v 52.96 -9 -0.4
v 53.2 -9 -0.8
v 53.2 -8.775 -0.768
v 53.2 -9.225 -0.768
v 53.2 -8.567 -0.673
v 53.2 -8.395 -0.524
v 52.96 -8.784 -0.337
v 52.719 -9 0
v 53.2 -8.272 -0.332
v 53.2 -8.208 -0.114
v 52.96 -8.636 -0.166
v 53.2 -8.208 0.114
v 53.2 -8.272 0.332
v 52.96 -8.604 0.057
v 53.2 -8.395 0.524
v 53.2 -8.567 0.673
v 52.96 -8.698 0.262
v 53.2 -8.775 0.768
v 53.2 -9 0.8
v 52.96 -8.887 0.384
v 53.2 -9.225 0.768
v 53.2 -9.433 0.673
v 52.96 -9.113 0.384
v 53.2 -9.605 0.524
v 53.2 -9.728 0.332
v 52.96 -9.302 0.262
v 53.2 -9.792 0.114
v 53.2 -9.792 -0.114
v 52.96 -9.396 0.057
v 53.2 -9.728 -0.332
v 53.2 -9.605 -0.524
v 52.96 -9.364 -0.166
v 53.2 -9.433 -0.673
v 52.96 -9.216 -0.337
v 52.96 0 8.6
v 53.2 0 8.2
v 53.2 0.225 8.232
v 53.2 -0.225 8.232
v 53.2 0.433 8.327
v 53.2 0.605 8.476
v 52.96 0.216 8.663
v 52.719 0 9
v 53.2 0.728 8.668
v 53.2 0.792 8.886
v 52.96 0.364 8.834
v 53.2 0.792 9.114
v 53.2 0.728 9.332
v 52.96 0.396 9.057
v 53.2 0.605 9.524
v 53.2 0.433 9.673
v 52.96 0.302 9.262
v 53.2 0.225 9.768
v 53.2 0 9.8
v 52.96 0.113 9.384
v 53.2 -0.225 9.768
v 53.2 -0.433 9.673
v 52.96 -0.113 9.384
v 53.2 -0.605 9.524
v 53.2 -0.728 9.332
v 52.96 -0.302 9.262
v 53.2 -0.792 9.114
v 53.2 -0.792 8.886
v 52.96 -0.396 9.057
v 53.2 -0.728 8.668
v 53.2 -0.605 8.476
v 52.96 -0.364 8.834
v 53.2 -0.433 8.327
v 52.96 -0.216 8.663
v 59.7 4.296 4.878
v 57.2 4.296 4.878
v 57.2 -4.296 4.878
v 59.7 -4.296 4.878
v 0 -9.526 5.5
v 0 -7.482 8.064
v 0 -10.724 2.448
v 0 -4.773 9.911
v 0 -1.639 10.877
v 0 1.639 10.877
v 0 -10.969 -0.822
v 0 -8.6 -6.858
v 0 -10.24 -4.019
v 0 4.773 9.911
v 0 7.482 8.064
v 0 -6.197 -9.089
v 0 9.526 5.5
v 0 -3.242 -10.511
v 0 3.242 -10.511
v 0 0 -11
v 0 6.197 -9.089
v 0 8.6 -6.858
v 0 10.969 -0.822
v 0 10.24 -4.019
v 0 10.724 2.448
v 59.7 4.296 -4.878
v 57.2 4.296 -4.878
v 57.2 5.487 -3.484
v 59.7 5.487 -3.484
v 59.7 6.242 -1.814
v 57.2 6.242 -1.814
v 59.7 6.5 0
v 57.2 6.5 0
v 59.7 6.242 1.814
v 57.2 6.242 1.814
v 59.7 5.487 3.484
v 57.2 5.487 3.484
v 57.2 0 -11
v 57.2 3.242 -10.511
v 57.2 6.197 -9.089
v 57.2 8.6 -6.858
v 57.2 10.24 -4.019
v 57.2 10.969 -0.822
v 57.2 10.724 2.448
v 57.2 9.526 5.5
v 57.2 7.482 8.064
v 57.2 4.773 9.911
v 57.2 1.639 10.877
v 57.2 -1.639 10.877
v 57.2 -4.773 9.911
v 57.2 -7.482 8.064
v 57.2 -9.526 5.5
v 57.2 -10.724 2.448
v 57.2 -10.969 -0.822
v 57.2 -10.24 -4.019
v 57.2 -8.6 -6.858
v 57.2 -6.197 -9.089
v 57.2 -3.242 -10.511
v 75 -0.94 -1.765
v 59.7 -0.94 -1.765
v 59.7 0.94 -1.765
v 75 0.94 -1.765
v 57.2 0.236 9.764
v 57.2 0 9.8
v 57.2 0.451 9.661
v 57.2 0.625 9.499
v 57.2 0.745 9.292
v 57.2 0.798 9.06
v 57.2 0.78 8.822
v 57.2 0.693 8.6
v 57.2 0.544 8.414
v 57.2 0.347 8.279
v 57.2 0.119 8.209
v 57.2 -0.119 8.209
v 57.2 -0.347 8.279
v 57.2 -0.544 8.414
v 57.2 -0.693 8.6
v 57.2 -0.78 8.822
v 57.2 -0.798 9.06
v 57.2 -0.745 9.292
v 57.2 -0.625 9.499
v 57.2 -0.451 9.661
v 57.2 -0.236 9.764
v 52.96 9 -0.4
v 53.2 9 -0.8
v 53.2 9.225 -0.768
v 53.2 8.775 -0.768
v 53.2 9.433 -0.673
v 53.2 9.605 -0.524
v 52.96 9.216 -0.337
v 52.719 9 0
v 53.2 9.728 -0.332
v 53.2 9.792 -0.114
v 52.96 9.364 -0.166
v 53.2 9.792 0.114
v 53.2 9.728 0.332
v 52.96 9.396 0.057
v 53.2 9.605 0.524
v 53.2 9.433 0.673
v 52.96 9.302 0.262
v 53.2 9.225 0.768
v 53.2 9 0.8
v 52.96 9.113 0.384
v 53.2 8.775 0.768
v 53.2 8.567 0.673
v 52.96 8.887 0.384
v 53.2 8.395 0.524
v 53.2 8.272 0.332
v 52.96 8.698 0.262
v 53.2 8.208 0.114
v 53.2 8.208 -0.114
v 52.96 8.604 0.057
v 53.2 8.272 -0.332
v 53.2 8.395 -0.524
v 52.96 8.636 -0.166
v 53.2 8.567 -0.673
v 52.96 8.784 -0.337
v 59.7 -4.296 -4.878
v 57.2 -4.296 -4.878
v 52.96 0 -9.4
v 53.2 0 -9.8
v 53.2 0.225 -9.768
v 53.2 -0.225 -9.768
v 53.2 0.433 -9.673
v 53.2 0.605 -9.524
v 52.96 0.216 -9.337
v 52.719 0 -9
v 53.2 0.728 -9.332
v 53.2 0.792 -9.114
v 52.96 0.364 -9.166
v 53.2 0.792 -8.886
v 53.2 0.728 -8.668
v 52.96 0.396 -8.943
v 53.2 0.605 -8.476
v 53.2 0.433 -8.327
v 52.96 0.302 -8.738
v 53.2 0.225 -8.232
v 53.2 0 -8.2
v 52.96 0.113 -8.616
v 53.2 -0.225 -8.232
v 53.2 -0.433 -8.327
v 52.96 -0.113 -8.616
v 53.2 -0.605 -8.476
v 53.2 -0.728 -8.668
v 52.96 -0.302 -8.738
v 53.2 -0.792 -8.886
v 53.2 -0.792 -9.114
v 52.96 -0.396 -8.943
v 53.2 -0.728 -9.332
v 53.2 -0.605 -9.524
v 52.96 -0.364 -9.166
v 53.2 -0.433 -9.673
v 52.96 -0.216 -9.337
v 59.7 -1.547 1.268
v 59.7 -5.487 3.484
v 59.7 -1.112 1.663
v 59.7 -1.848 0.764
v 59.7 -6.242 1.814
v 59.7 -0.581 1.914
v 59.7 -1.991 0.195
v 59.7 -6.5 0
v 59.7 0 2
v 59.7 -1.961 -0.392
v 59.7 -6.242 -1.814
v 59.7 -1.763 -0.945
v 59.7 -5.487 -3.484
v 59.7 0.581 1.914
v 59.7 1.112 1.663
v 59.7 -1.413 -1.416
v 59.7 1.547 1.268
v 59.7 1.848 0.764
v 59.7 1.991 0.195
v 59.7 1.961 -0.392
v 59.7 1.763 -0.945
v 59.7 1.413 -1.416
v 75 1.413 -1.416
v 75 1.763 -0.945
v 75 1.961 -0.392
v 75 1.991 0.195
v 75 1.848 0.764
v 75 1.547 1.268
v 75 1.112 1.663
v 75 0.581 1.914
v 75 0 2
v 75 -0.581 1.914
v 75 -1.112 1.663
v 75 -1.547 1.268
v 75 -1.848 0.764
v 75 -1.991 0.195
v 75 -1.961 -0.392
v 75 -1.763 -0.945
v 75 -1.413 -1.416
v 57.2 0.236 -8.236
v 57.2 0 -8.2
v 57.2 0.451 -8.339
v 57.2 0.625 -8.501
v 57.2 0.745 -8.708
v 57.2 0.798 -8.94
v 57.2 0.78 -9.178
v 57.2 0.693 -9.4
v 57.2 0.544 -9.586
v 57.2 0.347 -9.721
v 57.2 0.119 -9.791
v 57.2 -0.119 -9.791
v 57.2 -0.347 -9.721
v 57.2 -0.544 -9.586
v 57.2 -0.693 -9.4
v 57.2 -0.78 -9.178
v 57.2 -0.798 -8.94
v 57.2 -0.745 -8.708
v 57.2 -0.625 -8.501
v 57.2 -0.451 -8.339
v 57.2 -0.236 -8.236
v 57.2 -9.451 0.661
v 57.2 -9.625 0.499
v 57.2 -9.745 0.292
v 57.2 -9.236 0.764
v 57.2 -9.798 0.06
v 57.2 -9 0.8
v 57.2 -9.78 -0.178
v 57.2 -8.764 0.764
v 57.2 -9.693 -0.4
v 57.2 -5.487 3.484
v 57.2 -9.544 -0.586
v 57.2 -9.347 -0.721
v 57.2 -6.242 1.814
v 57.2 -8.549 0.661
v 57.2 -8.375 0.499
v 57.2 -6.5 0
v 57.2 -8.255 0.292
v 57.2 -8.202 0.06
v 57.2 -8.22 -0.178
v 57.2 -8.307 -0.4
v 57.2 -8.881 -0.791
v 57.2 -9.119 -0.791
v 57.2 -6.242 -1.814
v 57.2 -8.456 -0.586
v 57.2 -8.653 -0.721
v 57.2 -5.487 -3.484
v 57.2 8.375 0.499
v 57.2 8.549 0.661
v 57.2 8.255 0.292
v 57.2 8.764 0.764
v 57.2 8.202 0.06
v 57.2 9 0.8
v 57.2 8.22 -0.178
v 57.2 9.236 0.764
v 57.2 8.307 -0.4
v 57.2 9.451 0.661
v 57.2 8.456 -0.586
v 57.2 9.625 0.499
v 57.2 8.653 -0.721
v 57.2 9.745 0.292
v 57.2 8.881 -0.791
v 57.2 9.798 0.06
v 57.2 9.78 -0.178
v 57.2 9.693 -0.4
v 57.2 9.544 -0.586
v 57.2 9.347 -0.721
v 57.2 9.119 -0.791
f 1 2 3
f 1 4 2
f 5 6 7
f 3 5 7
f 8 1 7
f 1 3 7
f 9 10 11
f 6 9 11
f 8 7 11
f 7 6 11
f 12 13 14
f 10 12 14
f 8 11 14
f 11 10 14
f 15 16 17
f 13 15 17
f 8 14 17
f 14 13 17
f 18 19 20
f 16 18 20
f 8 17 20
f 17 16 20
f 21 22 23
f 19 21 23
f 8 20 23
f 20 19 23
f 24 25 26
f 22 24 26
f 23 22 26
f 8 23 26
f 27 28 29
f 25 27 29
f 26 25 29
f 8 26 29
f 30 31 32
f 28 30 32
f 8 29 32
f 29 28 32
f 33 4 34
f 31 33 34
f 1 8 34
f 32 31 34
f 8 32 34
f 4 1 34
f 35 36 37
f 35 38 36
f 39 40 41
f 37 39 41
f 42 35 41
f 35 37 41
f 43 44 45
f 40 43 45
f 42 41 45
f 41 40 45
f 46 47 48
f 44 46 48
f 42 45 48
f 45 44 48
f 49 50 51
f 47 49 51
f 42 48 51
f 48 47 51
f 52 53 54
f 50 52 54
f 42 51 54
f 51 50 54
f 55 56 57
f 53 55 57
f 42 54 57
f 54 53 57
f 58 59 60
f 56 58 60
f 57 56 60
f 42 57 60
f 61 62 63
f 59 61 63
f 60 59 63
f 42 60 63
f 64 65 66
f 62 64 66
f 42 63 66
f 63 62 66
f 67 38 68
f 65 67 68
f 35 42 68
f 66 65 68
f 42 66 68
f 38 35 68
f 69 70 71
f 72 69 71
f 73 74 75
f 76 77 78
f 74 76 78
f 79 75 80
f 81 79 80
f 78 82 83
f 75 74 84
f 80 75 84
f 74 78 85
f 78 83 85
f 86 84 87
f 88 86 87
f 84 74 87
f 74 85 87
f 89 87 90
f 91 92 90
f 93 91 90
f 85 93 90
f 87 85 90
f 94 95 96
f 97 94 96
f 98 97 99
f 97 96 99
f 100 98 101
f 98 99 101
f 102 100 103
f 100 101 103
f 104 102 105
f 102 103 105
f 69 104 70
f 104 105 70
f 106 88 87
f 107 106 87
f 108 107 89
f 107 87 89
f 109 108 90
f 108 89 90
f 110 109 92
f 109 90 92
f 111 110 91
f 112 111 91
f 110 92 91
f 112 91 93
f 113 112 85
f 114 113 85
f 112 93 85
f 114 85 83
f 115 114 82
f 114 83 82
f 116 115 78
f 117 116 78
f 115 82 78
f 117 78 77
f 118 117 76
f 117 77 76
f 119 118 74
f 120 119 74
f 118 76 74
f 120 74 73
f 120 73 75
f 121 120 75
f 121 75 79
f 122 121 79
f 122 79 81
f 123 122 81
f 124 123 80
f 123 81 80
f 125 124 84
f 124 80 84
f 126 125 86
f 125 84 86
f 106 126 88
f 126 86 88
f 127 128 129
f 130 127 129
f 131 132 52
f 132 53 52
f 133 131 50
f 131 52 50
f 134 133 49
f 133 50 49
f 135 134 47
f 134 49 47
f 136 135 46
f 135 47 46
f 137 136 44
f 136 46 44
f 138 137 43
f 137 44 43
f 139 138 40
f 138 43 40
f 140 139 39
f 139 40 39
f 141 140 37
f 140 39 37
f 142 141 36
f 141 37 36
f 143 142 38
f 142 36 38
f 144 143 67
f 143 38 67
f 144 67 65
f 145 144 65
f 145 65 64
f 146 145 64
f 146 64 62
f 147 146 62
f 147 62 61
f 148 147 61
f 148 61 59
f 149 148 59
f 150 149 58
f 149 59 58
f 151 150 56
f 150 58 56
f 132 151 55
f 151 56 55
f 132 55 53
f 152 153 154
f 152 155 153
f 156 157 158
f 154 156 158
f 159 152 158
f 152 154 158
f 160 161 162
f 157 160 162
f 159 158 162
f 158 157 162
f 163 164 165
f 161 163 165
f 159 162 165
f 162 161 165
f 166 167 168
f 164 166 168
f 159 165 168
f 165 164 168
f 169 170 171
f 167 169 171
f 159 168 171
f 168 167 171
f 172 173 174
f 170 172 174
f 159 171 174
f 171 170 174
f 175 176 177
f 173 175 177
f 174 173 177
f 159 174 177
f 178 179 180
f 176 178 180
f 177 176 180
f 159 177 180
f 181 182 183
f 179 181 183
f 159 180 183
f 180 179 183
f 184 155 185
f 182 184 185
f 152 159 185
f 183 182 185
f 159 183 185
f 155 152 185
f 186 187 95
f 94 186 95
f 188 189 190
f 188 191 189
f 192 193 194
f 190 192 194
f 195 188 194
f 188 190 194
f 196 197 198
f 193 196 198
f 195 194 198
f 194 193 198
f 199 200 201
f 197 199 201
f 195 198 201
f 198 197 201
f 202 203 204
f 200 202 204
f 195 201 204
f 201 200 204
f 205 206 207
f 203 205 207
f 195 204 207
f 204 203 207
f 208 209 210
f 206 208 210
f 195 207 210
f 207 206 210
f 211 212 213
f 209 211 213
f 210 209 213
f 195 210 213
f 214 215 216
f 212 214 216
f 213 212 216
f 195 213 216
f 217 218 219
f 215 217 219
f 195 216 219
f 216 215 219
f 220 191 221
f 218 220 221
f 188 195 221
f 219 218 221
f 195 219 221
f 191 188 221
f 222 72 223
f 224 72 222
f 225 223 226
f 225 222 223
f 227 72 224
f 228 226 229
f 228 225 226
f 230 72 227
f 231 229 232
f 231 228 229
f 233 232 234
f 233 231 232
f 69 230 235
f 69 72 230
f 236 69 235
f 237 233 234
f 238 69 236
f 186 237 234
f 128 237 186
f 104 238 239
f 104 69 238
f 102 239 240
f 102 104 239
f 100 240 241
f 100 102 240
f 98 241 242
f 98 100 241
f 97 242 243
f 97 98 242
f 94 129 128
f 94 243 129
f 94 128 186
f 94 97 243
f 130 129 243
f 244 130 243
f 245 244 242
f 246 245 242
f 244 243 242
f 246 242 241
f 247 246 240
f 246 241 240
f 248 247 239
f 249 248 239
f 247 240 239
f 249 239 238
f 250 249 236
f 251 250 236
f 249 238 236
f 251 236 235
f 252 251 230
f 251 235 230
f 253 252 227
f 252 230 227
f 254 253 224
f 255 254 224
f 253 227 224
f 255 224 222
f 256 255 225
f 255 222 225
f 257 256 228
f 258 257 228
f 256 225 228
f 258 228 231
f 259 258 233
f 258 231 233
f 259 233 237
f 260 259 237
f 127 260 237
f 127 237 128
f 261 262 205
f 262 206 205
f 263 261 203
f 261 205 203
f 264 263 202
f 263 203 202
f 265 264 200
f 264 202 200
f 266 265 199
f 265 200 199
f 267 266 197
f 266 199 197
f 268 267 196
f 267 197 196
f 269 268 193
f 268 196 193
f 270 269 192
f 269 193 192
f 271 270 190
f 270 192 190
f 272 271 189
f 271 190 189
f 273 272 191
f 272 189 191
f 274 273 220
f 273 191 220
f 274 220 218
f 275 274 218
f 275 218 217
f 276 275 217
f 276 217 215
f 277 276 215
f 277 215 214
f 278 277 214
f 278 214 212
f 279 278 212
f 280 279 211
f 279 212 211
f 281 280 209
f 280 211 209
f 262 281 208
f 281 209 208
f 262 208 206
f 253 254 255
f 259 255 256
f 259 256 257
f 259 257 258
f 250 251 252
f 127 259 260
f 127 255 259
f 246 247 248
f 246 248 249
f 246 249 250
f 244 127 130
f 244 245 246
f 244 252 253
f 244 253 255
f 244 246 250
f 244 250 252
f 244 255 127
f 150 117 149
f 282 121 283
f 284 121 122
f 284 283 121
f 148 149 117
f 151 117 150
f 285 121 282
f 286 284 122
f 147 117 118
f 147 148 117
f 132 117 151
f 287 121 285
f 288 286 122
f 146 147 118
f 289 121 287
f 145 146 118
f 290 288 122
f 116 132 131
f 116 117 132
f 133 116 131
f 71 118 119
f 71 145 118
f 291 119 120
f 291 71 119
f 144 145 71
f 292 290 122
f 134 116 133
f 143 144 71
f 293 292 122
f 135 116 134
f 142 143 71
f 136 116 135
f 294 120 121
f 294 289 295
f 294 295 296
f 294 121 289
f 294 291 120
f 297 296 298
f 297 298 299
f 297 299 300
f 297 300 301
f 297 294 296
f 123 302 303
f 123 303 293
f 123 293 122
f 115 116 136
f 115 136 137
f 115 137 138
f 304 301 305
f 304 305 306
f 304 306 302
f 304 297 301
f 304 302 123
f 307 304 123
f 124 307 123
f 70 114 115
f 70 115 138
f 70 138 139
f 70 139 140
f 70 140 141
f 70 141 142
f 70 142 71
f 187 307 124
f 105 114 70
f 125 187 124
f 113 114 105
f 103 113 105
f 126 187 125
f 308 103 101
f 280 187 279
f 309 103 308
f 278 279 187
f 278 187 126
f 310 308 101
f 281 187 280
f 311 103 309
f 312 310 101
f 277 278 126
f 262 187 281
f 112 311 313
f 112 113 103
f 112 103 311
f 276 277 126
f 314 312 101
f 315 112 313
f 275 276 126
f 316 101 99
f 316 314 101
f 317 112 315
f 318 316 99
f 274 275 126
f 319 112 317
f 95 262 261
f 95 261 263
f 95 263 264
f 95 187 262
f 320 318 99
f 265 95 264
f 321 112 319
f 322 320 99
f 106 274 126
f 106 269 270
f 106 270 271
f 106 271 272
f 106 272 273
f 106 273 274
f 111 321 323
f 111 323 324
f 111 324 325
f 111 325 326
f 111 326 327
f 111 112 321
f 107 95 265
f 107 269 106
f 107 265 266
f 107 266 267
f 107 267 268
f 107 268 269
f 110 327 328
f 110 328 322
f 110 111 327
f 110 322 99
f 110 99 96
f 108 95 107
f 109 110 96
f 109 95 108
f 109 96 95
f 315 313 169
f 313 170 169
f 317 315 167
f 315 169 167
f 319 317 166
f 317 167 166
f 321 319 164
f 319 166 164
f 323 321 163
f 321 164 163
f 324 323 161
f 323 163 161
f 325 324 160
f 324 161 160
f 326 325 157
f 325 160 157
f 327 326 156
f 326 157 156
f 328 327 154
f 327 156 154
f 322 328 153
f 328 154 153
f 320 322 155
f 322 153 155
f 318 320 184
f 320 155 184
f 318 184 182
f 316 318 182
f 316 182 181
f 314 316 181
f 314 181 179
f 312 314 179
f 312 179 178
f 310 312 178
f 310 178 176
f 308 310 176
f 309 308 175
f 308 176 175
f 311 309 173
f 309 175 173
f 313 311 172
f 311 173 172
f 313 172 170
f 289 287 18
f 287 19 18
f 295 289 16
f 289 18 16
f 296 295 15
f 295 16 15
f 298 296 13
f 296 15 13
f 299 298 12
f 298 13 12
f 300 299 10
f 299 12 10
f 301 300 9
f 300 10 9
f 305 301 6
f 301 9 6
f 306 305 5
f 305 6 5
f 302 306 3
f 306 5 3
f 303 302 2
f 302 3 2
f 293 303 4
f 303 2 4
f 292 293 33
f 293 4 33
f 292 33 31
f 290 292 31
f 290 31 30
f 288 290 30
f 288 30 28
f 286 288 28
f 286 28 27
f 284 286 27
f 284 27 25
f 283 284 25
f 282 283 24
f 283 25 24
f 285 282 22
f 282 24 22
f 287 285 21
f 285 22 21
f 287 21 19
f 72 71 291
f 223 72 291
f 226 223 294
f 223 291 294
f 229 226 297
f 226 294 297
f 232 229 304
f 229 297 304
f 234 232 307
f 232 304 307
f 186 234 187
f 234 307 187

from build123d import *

# Parameters (mm, degrees)
SKETCH1_R                       = 11
BOSS_EXTRUDE1_DEPTH             = 57.2
TAP_DRILL_FOR_M2X0_4_TAP1_D     = 1.6
TAP_DRILL_FOR_M2X0_4_TAP1_DEPTH = 4
TAP_DRILL_FOR_M2X0_4_TAP1_TIP   = 0.480688495
BOSS_EXTRUDE2_DEPTH             = 2.5
BOSS_EXTRUDE3_DEPTH             = 15.3


with BuildPart() as part:
    # Sketch1 → Boss-Extrude1 (new body)
    with BuildSketch(Plane(origin=(0, 0, 0), x_dir=(0, 0, -1), z_dir=(1, 0, 0))):
        Circle(SKETCH1_R)
    extrude(amount=BOSS_EXTRUDE1_DEPTH)

    # Tap Drill for M2x0.4 Tap1
    with Locations(Plane(origin=(57.2, 0, 0), x_dir=(0, 0, -1), z_dir=(1, 0, 0))):
        with Locations((9, 0), (0, 9), (-9, 0), (0, -9)):
            Hole(TAP_DRILL_FOR_M2X0_4_TAP1_D / 2, depth=TAP_DRILL_FOR_M2X0_4_TAP1_DEPTH)
            with Locations((0, 0, -(TAP_DRILL_FOR_M2X0_4_TAP1_DEPTH + TAP_DRILL_FOR_M2X0_4_TAP1_TIP / 2))):  # 118° drill point
                Cone(0, TAP_DRILL_FOR_M2X0_4_TAP1_D / 2, TAP_DRILL_FOR_M2X0_4_TAP1_TIP, mode=Mode.SUBTRACT)

    # Sketch4 → Boss-Extrude2 (add)
    with BuildSketch(Plane(origin=(57.2, 0, 0), x_dir=(0, 0, -1), z_dir=(1, 0, 0))):
        with BuildLine():
            Line((4.877567481, -4.296432877), (4.877567481, 4.296432877))
            ThreePointArc((4.877567481, 4.296432877), (0, 6.5), (-4.877567481, 4.296432877))
            Line((-4.877567481, 4.296432877), (-4.877567481, -4.296432877))
            ThreePointArc((-4.877567481, -4.296432877), (0, -6.5), (4.877567481, -4.296432877))
        make_face()
    extrude(amount=BOSS_EXTRUDE2_DEPTH)

    # Sketch5 → Boss-Extrude3 (add)
    with BuildSketch(Plane(origin=(59.7, 0, 0), x_dir=(0, 0, -1), z_dir=(1, 0, 0))):
        with BuildLine():
            Line((1.765106223, -0.940425447), (1.765106223, 0.940425447))
            ThreePointArc((1.765106223, 0.940425447), (-2, 0), (1.765106223, -0.940425447))
        make_face()
    extrude(amount=BOSS_EXTRUDE3_DEPTH)


solid = part.part
